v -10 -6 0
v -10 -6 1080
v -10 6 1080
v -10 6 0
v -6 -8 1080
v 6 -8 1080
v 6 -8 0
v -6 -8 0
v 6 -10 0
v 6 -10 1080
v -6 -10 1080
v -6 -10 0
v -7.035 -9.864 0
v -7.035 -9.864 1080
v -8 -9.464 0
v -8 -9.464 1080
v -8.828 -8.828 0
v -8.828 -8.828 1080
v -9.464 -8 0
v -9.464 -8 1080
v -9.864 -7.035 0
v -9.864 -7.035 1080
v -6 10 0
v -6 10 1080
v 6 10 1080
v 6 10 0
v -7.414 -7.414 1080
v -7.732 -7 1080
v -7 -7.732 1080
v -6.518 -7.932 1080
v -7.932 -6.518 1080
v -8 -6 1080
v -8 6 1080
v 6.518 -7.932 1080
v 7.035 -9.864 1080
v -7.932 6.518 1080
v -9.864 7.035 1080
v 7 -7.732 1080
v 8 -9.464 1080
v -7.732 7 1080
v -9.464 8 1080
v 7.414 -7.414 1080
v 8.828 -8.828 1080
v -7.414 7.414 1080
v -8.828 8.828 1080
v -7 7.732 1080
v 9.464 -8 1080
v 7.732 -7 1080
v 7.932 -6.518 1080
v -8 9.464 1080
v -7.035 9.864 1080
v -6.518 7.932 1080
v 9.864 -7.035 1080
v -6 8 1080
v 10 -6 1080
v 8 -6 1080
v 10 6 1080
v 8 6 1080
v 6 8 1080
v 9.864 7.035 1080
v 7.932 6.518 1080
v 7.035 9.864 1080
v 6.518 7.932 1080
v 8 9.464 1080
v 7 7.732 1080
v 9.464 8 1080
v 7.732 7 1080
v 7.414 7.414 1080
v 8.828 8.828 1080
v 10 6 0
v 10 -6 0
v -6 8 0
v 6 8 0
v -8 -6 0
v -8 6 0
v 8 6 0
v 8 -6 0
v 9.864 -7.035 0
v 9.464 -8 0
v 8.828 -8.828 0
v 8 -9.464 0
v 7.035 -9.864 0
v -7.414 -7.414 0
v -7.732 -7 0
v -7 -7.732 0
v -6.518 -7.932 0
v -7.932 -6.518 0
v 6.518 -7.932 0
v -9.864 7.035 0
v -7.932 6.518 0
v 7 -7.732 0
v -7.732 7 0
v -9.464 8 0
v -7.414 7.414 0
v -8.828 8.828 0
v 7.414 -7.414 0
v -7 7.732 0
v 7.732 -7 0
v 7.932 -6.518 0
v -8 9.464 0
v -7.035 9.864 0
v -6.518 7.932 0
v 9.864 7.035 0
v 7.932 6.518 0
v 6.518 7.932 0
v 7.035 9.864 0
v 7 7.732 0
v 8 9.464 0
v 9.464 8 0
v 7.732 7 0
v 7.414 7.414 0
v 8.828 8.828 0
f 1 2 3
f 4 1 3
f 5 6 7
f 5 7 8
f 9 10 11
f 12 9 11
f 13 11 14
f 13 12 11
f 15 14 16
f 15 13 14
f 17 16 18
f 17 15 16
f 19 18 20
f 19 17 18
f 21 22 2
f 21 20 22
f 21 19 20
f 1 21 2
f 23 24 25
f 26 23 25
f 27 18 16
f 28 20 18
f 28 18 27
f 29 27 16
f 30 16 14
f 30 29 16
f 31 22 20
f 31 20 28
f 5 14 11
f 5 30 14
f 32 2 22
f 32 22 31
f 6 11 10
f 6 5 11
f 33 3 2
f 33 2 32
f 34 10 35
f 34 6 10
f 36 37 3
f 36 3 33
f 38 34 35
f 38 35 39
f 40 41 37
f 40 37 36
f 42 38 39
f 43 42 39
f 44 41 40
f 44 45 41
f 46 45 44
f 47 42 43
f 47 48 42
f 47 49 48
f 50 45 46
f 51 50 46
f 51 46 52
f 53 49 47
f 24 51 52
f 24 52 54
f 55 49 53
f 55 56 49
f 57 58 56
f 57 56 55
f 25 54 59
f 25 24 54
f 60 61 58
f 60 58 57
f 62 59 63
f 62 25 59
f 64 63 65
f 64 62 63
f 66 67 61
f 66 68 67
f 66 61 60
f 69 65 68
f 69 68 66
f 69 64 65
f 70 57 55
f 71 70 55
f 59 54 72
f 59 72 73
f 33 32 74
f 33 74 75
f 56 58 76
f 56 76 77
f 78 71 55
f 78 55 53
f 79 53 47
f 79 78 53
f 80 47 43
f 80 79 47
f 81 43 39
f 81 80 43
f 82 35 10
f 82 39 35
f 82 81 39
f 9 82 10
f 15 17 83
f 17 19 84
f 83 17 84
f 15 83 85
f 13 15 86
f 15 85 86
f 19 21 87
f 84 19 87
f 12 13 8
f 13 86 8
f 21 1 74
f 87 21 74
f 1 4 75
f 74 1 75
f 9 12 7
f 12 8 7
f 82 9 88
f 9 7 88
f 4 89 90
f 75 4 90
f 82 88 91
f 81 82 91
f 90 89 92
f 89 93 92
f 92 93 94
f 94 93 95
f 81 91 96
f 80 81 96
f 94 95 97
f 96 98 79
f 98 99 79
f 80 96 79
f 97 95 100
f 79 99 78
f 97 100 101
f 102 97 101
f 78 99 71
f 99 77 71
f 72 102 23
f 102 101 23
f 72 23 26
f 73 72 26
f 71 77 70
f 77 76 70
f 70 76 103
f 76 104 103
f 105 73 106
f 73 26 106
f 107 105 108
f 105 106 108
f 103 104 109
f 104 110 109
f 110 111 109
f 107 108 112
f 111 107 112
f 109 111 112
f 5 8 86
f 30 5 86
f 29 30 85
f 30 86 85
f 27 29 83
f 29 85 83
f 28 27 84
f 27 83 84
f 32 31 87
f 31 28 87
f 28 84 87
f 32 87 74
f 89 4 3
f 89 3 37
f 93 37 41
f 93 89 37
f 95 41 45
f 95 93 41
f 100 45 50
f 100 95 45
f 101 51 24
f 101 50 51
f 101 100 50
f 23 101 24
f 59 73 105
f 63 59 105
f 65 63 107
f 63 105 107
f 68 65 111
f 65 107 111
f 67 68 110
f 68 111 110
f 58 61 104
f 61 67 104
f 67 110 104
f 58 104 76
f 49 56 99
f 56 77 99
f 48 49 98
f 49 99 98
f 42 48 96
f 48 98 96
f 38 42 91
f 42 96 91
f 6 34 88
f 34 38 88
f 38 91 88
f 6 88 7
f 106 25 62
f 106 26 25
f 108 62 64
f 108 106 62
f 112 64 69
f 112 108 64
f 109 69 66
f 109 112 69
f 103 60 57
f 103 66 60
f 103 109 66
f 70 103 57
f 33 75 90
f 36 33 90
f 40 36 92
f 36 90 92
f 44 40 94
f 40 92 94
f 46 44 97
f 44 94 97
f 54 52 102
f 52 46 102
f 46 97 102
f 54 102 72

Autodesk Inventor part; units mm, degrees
ref_plane "Start plane" through (0, 0, 0) normal (0, 0, 1) x (1, 0, 0)
ref_plane "End plane" through (0, 0, 1080) normal (0, 0, 1) x (1, 0, 0)
sketch "Sketch" plane through (0, 0, 0) normal (0, 0, 1) x (1, 0, 0)
  line L0 (-10, -6) -> (-10, 6)
  line L1 (-6, 10) -> (6, 10)
  line L2 (10, 6) -> (10, -6)
  line L3 (6, -10) -> (-6, -10)
  arc A0 (-10, -6) -> (-6, -10) centre (-6, -6) ccw
  arc A1 (10, 6) -> (6, 10) centre (6, 6) ccw
  arc A2 (-6, 10) -> (-10, 6) centre (-6, 6) ccw
  arc A3 (6, -10) -> (10, -6) centre (6, -6) ccw
  arc A4 (-6, 8) -> (-8, 6) centre (-6, 6) ccw
  line L4 (-6, 8) -> (6, 8)
  arc A5 (8, 6) -> (6, 8) centre (6, 6) ccw
  line L5 (8, 6) -> (8, -6)
  arc A6 (6, -8) -> (8, -6) centre (6, -6) ccw
  line L6 (6, -8) -> (-6, -8)
  arc A7 (-8, -6) -> (-6, -8) centre (-6, -6) ccw
  line L7 (-8, -6) -> (-8, 6)
  line L8 (0, 15.1598) -> (0, -15.1598) construction
  line L9 (-15.1598, 0) -> (15.1598, 0) construction
  dimension "d7" = 4
  dimension "d9" = 20
  dimension "d11" = 20
  dimension "d12" = 2
  dimension "d15" = 10
  dimension "d16" = 10
extrude "Body" add sketch "Sketch" along normal up to surface (1080 mm away) from surface at 0
sketch "Sketch3" plane through (0, 0, 0) normal (0, 0, 1) x (1, 0, 0)
  line L0 (0, 0) -> (10, 0)
ref_plane "Work Plane3" through (0, 0, 0) normal (0, -1, 0) x (1, 0, 0)
sketch "Sketch4" plane through (0, 0, 0) normal (0, -1, 0) x (1, 0, 0)
  line L0 (-2, 0) -> (12, 0)
  line L1 (-2, 1080) -> (12, 1080)
  dimension "d18" = 1080
ref_plane "Work Plane4" through (0, 10, 1080) normal (0, 0, 1) x (1, 0, 0)
split "Split1" plane through (0, 10, 1080) removes the side toward (0, 0, 1)
equation "\"d7\" = G_IR"
equation "\"d9\" = G_W"
equation "\"d11\" = G_H"
equation "\"d12\" = G_T"
equation "\"d15\" = 0.5 * d9"
equation "\"d16\" = 0.5 * d11"
equation "\"d3\" = G_L"
equation "\"G_W\" = 20"
equation "\"G_H\" = 20"
equation "\"G_T\" = 2"
equation "\"G_IR\" = 4"
equation "\"G_L\" = d18"
equation "\"G_OFFSET_START\" = 0"
properties part number "ISO 4019 - 20x20x2 - 1080" material "Steel, Mild"
